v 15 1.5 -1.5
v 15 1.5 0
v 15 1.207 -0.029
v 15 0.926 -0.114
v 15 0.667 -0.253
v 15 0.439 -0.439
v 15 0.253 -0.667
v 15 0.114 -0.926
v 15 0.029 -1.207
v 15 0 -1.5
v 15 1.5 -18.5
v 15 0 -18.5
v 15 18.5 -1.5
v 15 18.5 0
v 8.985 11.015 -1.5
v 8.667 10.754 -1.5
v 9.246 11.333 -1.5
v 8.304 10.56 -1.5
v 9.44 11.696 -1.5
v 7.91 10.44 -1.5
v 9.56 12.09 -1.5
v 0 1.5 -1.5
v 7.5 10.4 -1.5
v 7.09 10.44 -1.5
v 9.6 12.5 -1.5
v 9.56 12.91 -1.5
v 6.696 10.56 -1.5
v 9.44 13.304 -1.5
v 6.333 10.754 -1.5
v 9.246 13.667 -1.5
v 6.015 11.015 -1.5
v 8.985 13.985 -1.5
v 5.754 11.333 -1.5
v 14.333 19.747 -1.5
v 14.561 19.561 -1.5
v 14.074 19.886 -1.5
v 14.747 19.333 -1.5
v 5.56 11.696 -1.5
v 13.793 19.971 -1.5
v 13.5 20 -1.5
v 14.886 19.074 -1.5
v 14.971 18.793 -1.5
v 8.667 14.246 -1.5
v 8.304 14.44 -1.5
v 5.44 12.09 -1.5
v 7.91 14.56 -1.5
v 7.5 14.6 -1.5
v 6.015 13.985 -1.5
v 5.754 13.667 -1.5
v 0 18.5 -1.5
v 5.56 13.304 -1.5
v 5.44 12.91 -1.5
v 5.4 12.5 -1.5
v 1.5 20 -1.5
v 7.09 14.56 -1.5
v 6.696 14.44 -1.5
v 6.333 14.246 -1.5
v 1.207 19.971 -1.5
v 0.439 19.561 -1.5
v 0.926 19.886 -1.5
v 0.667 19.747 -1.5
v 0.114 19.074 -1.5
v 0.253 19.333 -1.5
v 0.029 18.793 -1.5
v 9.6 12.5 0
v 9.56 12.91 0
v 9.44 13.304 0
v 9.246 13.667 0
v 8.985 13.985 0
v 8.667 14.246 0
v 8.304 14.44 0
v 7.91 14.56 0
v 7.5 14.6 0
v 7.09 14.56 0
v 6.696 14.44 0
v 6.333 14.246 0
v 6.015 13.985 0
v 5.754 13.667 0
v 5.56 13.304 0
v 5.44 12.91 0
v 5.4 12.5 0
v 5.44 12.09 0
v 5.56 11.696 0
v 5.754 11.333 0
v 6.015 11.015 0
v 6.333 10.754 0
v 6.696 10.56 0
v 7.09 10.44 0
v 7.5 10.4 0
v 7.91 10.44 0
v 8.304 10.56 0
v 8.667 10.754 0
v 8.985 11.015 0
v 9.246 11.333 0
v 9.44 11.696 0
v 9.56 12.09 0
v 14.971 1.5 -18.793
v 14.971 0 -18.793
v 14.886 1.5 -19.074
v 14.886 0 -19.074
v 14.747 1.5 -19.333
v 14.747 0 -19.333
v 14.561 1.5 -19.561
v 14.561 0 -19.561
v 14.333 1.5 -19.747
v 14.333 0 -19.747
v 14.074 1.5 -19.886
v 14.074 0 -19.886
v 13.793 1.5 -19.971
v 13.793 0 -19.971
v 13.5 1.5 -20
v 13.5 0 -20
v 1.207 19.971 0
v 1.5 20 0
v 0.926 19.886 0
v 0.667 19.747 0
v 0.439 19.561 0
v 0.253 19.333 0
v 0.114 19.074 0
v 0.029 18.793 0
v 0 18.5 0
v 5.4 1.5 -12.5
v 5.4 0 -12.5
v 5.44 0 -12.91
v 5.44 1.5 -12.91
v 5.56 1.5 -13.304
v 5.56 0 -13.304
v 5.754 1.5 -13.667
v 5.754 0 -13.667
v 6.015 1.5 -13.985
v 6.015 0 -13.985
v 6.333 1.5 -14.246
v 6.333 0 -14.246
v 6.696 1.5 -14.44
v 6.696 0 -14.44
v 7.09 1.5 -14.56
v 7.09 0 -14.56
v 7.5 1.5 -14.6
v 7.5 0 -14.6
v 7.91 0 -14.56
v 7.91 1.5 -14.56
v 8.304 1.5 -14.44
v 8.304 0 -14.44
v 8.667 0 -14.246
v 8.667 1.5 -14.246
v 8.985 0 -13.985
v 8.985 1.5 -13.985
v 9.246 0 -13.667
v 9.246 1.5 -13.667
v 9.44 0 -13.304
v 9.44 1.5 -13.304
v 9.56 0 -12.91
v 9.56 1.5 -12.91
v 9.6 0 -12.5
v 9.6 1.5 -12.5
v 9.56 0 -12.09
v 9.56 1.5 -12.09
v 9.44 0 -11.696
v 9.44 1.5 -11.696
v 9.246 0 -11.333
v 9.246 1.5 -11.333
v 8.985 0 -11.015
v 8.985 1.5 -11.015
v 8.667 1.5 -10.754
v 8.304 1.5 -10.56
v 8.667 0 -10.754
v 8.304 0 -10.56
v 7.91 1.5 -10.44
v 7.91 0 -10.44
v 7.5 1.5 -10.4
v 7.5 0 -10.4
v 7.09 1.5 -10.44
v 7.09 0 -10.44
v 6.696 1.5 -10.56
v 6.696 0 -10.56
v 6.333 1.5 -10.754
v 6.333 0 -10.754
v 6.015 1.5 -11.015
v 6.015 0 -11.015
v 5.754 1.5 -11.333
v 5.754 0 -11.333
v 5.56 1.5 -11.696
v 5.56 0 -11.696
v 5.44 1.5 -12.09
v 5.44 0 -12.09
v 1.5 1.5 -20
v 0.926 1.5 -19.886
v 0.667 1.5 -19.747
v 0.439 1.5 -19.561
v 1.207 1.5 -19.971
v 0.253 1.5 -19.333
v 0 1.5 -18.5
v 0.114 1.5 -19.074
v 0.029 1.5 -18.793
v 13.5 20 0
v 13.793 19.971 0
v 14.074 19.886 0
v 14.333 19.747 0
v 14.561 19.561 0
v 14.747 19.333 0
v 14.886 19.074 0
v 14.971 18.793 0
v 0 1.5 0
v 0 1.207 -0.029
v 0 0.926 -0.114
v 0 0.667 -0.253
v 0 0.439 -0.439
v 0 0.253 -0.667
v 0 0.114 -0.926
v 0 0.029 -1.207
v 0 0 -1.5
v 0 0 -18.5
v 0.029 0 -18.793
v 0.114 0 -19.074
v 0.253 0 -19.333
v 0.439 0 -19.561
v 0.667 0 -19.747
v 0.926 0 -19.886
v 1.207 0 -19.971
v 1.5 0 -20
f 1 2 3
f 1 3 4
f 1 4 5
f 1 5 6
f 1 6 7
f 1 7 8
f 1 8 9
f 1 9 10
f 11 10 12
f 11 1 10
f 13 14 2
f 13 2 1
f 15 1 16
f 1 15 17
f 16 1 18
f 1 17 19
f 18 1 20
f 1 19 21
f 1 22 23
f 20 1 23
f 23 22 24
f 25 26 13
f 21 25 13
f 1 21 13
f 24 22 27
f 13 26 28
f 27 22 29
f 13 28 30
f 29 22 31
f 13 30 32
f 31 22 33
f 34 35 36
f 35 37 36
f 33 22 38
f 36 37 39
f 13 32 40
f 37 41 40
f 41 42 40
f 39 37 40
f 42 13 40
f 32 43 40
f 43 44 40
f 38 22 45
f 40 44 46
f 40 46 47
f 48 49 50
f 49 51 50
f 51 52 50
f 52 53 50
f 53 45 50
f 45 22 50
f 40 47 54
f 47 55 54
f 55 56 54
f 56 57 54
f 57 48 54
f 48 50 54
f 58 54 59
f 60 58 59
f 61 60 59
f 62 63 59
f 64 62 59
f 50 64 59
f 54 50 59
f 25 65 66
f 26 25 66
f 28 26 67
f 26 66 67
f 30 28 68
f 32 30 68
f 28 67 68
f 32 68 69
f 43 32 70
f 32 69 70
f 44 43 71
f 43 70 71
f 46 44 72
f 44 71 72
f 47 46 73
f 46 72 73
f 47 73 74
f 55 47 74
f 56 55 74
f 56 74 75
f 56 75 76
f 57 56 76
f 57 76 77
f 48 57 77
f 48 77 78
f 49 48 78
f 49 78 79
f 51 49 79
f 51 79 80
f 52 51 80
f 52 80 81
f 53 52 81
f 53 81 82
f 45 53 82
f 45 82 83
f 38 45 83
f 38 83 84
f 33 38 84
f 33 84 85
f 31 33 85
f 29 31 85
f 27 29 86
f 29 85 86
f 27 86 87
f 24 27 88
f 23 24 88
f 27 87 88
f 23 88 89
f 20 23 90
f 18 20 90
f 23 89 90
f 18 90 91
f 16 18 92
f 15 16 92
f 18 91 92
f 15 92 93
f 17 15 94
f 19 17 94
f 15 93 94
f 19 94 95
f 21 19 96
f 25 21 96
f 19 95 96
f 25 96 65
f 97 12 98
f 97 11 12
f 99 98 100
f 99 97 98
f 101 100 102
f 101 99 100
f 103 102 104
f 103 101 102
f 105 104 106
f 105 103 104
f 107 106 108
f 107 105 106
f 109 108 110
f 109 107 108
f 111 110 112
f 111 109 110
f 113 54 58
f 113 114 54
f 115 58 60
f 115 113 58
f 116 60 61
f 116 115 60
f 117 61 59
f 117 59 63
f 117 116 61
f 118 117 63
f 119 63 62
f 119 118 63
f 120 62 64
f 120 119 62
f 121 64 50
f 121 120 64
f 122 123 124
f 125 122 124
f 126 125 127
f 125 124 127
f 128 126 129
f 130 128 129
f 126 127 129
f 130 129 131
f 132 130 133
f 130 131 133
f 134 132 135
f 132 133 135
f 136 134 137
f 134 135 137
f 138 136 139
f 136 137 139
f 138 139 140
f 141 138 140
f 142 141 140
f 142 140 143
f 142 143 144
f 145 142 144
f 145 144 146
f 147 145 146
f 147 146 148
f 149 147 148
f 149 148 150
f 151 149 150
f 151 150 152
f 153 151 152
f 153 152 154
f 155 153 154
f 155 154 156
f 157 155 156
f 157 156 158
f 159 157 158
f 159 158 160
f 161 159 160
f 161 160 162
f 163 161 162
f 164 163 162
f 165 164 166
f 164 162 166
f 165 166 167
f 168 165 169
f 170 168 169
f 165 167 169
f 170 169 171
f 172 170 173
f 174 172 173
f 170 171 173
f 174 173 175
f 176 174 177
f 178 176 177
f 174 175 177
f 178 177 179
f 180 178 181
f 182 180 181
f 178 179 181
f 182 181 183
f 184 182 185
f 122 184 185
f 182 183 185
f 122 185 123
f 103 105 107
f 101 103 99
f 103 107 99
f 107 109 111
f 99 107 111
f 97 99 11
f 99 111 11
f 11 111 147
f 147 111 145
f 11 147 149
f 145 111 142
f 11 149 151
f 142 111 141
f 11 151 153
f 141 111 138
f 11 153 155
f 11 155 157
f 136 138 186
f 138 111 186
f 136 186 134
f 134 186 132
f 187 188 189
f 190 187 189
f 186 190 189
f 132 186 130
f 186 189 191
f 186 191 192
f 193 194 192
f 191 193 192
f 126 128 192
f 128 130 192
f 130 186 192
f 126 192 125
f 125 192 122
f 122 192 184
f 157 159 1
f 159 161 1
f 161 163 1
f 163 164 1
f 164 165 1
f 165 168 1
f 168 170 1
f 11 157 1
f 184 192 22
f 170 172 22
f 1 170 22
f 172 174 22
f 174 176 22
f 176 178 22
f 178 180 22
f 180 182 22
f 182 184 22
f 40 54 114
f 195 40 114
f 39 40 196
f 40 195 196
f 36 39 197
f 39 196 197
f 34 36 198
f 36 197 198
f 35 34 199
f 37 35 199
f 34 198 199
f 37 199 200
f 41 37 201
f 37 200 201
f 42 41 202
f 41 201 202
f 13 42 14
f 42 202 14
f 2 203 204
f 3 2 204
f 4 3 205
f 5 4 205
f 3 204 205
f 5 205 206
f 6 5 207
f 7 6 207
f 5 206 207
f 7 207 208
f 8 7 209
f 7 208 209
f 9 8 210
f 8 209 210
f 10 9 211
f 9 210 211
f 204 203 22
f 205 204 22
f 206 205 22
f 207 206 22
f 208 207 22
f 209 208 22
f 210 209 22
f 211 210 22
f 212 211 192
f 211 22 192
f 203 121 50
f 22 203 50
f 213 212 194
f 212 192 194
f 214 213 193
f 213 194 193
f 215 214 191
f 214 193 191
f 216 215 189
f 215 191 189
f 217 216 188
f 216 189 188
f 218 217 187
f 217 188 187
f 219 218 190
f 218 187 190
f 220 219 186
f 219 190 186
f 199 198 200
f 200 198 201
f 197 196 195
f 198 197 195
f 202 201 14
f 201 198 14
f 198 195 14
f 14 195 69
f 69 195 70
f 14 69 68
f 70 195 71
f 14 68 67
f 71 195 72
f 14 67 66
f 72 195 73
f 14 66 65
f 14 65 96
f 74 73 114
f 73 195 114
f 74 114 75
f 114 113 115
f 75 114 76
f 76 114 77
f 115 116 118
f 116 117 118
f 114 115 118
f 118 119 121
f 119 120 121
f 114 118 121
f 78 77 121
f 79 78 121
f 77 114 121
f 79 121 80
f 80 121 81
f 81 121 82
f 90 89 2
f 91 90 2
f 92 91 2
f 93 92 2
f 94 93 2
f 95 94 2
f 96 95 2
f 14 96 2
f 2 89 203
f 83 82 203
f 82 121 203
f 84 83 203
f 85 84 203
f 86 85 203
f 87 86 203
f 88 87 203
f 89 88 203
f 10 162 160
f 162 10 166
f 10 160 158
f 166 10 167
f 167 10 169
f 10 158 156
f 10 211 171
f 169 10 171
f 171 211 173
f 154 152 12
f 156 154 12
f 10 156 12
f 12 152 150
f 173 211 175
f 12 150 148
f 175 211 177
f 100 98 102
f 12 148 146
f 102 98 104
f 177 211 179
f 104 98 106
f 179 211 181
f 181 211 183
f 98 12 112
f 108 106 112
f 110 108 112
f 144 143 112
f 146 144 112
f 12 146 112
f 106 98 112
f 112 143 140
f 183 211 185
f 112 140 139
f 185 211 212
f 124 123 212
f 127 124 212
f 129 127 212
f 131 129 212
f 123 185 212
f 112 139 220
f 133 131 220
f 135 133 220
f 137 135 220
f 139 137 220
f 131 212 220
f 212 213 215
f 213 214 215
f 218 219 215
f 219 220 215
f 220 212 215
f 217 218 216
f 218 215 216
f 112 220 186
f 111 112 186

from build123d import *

# Parameters (mm, degrees)
EXTRUDE_THIN1_DEPTH        = 15
F_4_2_4_2_DIAMETER_HOLE1_D = 4.2
F_4_2_4_2_DIAMETER_HOLE2_D = 4.2
FILLET1_R                  = 1.5


with BuildPart() as part:
    # Sketch1 → Extrude-Thin1 (new body)
    with BuildSketch(Plane(origin=(0, 0, 0), x_dir=(0, 0, -1), z_dir=(1, 0, 0))):
        with BuildLine():
            Line((0, 20), (0, 1.5))
            ThreePointArc((0, 1.5), (0.439339828, 0.439339828), (1.5, 0))
            Line((1.5, 0), (20, 0))
            Line((20, 0), (20, 1.5))
            Line((20, 1.5), (1.5, 1.5))
            Line((1.5, 1.5), (1.5, 20))
            Line((1.5, 20), (0, 20))
        make_face()
    extrude(amount=EXTRUDE_THIN1_DEPTH)

    # Ø4.2 (4.2) Diameter Hole1 (through all)
    with Locations(Plane(origin=(0, 1.5, 0), x_dir=(1, 0, 0), z_dir=(0, 1, 0))):
        with Locations((7.5, 12.5)):
            Hole(F_4_2_4_2_DIAMETER_HOLE1_D / 2)

    # Ø4.2 (4.2) Diameter Hole2 (through all)
    with Locations(Plane(origin=(0, 0, -1.5), x_dir=(-1, 0, 0), z_dir=(0, 0, -1))):
        with Locations((-7.5, 12.5)):
            Hole(F_4_2_4_2_DIAMETER_HOLE2_D / 2)

    # Fillet1
    fillet1_edges = [part.edges().sort_by_distance(p)[0] for p in [
        (15, 20, -0.75),
        (0, 20, -0.75),
        (15, 0.75, -20),
        (0, 0.75, -20),
    ]]
    fillet(fillet1_edges, radius=FILLET1_R)


solid = part.part
